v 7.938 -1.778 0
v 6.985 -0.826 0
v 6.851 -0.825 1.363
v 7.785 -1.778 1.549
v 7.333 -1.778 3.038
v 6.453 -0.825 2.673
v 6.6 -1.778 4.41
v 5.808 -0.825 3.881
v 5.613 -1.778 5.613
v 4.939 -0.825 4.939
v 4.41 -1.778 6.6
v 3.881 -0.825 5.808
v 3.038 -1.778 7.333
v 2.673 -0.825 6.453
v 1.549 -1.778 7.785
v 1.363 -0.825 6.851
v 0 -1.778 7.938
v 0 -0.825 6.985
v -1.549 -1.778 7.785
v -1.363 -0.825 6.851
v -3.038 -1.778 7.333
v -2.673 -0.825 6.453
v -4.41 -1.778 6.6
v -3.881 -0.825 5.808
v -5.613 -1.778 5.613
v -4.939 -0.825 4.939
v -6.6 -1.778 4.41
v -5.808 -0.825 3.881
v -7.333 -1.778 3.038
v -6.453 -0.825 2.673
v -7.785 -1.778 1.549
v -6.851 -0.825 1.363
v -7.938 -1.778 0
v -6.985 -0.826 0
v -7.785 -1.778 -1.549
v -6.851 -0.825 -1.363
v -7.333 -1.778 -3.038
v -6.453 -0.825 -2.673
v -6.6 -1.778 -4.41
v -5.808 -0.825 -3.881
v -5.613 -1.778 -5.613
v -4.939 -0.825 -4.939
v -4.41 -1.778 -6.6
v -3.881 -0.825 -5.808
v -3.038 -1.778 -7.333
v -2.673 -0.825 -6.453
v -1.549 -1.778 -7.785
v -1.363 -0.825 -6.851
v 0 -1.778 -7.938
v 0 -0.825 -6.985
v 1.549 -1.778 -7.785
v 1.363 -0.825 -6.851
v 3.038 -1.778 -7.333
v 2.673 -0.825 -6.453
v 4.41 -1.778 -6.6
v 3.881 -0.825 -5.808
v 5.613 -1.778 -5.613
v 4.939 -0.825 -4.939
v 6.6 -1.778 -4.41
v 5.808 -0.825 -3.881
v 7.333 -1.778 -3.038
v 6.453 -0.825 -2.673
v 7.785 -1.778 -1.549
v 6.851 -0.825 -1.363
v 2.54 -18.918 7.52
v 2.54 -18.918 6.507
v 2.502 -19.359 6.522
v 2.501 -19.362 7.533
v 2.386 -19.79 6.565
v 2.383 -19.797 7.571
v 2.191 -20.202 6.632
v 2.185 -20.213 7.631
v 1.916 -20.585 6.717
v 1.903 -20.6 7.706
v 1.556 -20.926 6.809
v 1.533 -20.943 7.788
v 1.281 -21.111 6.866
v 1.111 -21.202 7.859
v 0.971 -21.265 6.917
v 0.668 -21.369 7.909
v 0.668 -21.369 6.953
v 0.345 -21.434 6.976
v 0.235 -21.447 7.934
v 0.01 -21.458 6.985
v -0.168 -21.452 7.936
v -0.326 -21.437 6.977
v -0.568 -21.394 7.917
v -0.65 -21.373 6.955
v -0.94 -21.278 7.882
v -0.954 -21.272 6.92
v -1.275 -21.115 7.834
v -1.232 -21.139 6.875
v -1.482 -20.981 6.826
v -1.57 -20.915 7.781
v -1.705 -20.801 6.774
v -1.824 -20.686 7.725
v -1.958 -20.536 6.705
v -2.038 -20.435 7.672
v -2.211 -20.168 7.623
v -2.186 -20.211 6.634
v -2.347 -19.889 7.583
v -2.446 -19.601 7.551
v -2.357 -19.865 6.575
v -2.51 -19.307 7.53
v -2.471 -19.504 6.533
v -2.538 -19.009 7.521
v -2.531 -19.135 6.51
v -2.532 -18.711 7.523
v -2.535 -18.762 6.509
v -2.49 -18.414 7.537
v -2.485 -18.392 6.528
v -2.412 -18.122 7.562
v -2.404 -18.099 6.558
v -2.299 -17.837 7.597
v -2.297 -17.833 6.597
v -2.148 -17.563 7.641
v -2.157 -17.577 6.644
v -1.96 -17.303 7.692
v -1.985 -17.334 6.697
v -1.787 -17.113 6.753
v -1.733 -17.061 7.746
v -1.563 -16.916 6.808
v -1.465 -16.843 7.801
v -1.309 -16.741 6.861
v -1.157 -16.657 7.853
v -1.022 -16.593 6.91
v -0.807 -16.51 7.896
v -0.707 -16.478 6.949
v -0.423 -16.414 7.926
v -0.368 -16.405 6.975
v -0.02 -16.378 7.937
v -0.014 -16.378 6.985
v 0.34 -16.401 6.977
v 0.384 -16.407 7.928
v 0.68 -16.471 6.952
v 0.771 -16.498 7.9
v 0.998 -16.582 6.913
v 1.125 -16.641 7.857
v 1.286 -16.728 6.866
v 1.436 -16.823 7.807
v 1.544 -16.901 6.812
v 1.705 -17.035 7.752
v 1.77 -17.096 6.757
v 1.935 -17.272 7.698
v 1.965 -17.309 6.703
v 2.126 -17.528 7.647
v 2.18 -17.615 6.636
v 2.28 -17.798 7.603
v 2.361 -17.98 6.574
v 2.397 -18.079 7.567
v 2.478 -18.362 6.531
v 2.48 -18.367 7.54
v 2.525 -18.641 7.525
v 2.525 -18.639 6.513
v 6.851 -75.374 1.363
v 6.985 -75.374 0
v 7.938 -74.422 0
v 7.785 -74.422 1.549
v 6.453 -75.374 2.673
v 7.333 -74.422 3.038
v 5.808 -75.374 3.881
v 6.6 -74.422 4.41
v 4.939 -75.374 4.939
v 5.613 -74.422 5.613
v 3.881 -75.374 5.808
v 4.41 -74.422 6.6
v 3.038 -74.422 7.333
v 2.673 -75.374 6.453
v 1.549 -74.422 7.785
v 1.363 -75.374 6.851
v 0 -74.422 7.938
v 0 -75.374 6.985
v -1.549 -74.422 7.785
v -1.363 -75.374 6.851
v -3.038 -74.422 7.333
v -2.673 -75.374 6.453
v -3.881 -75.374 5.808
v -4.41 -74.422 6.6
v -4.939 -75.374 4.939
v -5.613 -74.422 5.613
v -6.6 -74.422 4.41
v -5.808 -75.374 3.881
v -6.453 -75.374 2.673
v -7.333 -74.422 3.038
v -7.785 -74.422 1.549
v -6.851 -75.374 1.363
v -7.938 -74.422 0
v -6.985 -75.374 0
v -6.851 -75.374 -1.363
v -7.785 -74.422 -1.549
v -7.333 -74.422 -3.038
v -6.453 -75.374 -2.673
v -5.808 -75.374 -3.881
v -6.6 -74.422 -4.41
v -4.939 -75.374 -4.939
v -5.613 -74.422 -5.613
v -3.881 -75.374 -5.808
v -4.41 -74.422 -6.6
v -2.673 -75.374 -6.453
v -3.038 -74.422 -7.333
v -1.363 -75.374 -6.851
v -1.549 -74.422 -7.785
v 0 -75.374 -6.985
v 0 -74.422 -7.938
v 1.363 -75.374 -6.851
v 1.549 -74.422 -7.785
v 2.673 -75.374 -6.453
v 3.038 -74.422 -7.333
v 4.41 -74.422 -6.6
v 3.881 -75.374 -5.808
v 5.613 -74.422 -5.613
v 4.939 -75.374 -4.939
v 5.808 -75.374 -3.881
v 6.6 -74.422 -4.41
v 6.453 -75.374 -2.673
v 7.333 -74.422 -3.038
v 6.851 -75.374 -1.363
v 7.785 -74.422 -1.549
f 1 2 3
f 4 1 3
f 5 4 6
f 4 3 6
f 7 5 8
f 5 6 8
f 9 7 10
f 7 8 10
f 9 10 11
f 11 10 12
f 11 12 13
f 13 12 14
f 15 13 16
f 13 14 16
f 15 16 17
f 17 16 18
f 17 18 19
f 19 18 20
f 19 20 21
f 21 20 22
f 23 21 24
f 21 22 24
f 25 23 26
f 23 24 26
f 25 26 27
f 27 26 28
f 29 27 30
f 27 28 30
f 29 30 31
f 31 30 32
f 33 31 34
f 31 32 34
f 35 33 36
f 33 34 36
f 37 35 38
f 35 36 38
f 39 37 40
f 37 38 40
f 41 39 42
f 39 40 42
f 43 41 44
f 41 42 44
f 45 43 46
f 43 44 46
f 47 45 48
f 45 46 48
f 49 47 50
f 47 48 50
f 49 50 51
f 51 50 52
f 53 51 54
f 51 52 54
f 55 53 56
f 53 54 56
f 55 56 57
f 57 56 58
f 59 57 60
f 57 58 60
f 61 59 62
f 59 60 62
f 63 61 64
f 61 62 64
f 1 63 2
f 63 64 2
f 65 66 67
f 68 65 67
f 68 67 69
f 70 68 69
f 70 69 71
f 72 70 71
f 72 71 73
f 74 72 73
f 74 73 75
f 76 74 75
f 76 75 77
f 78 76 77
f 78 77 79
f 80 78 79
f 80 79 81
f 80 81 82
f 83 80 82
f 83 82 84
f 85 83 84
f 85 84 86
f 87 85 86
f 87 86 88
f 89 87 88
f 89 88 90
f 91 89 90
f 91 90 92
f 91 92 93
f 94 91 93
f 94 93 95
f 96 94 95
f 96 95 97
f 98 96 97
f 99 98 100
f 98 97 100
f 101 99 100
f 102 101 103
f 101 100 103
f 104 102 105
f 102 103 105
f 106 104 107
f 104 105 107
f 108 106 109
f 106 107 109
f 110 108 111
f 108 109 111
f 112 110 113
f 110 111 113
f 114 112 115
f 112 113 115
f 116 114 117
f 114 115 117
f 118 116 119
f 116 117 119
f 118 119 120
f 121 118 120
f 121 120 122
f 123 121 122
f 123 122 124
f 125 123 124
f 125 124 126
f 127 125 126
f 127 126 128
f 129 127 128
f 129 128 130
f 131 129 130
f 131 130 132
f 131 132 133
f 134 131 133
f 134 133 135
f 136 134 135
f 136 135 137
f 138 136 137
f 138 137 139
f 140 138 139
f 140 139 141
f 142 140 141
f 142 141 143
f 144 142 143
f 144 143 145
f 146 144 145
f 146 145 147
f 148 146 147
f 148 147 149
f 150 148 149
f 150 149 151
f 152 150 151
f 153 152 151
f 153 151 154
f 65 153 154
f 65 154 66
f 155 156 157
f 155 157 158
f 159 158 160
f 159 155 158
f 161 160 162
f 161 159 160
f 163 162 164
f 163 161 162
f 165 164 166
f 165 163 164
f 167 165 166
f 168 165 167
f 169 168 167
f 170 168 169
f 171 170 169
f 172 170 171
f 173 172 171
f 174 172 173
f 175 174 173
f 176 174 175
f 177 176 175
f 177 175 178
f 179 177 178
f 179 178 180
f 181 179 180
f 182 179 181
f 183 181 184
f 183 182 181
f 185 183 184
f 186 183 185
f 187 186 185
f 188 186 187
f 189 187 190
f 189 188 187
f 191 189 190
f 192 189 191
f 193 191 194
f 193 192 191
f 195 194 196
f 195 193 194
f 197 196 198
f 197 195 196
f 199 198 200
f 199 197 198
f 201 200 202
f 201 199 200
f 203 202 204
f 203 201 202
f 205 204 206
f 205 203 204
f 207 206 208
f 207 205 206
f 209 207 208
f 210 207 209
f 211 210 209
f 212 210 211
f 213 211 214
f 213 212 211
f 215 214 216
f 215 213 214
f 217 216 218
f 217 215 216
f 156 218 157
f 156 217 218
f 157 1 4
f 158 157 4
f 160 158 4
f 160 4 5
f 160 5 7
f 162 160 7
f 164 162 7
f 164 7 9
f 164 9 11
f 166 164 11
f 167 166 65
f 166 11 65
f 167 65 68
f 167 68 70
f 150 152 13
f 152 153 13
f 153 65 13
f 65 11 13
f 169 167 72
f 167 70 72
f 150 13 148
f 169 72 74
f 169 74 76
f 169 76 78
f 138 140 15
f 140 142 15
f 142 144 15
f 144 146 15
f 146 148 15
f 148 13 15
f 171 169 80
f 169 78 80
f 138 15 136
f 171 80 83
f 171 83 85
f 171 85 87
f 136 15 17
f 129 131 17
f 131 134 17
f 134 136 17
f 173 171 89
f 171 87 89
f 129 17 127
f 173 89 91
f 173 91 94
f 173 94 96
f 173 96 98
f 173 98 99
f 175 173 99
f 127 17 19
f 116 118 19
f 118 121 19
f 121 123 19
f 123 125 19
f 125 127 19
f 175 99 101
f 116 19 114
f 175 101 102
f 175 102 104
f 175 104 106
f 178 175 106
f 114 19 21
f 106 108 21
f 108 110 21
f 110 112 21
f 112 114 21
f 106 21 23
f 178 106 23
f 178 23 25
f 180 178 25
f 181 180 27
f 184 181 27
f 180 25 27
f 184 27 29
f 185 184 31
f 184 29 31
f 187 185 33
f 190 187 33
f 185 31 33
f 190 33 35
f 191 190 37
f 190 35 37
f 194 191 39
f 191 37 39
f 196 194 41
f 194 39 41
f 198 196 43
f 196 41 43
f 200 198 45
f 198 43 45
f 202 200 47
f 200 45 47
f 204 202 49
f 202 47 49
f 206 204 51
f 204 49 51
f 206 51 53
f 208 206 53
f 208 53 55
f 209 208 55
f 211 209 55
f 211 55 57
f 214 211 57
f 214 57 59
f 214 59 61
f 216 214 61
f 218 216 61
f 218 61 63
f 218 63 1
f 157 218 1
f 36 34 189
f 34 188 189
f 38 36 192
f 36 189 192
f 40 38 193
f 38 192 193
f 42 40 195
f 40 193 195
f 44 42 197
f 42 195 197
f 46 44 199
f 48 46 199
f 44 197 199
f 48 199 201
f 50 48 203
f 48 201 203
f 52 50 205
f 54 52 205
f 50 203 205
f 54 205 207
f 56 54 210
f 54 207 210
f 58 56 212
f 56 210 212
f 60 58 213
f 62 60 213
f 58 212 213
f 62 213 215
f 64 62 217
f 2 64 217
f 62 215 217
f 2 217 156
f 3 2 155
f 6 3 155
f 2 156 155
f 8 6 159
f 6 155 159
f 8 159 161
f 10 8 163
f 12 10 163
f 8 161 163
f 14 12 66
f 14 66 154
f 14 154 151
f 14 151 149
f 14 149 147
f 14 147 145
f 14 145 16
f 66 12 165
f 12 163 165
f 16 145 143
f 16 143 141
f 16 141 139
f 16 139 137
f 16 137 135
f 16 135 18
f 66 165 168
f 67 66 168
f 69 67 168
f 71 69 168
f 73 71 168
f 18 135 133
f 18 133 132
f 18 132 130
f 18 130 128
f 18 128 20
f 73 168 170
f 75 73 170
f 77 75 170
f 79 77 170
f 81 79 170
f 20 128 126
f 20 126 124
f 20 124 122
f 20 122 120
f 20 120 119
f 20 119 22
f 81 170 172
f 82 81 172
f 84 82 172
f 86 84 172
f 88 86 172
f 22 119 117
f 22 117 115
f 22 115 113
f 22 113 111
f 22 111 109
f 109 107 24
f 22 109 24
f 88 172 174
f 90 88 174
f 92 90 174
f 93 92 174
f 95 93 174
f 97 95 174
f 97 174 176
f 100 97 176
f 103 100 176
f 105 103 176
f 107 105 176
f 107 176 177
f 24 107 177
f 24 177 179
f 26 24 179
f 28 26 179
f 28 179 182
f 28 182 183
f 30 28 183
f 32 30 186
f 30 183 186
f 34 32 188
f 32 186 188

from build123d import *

# Parameters (mm, degrees)
F0_R     = 7.9375
F1_DEPTH = 76.2
F3_D     = 13.97
F3_DEPTH = 76.2
F3_TIP   = 4.1970114239
F7_D     = 5.08
F7_DEPTH = 25.4
F7_TIP   = 1.5261859723


# Not quite as in the source:
# - a fillet or chamfer that OpenCascade refuses, or shapes differently, is made with other operations: its cross-section is extruded or revolved along the edge and cut away or added


with BuildPart() as f1:
    # F0 (on Front) → F1 (new body)
    with BuildSketch(Plane.XZ):
        Circle(F0_R)
    extrude(amount=F1_DEPTH)

    # F3
    with Locations(Plane(origin=(0, 0, 0), x_dir=(1, 0, 0), z_dir=(0, 1, 0))):
        with Locations((0, 0)):
            Hole(F3_D / 2, depth=F3_DEPTH)
            with Locations((0, 0, -(F3_DEPTH + F3_TIP / 2))):  # 118° drill point
                Cone(0, F3_D / 2, F3_TIP, mode=Mode.SUBTRACT)

    # F4: chamfer of 1.778 on 1 edges, made by hand

    # F4_s1 → F4_t2 (revolve, cut)
    with BuildSketch(Plane.XY):
        Polygon((7.9375, -74.422), (6.1595, -76.2), (7.9375, -76.2), align=None)
    revolve(axis=Axis((0, -76.2, 0), (0, -1, 0)), mode=Mode.SUBTRACT)

    # F5: chamfer of 1.778 on 1 edges, made by hand

    # F5_s1 → F5_t2 (revolve, cut)
    with BuildSketch(Plane.XY):
        Polygon((7.9375, -1.778), (6.1595, 0), (7.9375, 0), align=None)
    revolve(axis=Axis((0, 0, 0), (0, -1, 0)), mode=Mode.SUBTRACT)

    # F7 (one way)
    with BuildSketch(Plane(origin=(0, 0, 0), x_dir=(1, 0, 0), z_dir=(0, 0, -1))):
        with Locations((0, 18.9180281013)):
            Circle(F7_D / 2)
    extrude(amount=-F7_DEPTH, mode=Mode.SUBTRACT)
    with Locations(Plane(origin=(0, 0, 0), x_dir=(1, 0, 0), z_dir=(0, 0, -1))):
        with Locations((0, 18.9180281013)):
            with Locations((0, 0, -(F7_DEPTH + F7_TIP / 2))):  # 118° drill point
                Cone(0, F7_D / 2, F7_TIP, mode=Mode.SUBTRACT)


solid = f1.part
